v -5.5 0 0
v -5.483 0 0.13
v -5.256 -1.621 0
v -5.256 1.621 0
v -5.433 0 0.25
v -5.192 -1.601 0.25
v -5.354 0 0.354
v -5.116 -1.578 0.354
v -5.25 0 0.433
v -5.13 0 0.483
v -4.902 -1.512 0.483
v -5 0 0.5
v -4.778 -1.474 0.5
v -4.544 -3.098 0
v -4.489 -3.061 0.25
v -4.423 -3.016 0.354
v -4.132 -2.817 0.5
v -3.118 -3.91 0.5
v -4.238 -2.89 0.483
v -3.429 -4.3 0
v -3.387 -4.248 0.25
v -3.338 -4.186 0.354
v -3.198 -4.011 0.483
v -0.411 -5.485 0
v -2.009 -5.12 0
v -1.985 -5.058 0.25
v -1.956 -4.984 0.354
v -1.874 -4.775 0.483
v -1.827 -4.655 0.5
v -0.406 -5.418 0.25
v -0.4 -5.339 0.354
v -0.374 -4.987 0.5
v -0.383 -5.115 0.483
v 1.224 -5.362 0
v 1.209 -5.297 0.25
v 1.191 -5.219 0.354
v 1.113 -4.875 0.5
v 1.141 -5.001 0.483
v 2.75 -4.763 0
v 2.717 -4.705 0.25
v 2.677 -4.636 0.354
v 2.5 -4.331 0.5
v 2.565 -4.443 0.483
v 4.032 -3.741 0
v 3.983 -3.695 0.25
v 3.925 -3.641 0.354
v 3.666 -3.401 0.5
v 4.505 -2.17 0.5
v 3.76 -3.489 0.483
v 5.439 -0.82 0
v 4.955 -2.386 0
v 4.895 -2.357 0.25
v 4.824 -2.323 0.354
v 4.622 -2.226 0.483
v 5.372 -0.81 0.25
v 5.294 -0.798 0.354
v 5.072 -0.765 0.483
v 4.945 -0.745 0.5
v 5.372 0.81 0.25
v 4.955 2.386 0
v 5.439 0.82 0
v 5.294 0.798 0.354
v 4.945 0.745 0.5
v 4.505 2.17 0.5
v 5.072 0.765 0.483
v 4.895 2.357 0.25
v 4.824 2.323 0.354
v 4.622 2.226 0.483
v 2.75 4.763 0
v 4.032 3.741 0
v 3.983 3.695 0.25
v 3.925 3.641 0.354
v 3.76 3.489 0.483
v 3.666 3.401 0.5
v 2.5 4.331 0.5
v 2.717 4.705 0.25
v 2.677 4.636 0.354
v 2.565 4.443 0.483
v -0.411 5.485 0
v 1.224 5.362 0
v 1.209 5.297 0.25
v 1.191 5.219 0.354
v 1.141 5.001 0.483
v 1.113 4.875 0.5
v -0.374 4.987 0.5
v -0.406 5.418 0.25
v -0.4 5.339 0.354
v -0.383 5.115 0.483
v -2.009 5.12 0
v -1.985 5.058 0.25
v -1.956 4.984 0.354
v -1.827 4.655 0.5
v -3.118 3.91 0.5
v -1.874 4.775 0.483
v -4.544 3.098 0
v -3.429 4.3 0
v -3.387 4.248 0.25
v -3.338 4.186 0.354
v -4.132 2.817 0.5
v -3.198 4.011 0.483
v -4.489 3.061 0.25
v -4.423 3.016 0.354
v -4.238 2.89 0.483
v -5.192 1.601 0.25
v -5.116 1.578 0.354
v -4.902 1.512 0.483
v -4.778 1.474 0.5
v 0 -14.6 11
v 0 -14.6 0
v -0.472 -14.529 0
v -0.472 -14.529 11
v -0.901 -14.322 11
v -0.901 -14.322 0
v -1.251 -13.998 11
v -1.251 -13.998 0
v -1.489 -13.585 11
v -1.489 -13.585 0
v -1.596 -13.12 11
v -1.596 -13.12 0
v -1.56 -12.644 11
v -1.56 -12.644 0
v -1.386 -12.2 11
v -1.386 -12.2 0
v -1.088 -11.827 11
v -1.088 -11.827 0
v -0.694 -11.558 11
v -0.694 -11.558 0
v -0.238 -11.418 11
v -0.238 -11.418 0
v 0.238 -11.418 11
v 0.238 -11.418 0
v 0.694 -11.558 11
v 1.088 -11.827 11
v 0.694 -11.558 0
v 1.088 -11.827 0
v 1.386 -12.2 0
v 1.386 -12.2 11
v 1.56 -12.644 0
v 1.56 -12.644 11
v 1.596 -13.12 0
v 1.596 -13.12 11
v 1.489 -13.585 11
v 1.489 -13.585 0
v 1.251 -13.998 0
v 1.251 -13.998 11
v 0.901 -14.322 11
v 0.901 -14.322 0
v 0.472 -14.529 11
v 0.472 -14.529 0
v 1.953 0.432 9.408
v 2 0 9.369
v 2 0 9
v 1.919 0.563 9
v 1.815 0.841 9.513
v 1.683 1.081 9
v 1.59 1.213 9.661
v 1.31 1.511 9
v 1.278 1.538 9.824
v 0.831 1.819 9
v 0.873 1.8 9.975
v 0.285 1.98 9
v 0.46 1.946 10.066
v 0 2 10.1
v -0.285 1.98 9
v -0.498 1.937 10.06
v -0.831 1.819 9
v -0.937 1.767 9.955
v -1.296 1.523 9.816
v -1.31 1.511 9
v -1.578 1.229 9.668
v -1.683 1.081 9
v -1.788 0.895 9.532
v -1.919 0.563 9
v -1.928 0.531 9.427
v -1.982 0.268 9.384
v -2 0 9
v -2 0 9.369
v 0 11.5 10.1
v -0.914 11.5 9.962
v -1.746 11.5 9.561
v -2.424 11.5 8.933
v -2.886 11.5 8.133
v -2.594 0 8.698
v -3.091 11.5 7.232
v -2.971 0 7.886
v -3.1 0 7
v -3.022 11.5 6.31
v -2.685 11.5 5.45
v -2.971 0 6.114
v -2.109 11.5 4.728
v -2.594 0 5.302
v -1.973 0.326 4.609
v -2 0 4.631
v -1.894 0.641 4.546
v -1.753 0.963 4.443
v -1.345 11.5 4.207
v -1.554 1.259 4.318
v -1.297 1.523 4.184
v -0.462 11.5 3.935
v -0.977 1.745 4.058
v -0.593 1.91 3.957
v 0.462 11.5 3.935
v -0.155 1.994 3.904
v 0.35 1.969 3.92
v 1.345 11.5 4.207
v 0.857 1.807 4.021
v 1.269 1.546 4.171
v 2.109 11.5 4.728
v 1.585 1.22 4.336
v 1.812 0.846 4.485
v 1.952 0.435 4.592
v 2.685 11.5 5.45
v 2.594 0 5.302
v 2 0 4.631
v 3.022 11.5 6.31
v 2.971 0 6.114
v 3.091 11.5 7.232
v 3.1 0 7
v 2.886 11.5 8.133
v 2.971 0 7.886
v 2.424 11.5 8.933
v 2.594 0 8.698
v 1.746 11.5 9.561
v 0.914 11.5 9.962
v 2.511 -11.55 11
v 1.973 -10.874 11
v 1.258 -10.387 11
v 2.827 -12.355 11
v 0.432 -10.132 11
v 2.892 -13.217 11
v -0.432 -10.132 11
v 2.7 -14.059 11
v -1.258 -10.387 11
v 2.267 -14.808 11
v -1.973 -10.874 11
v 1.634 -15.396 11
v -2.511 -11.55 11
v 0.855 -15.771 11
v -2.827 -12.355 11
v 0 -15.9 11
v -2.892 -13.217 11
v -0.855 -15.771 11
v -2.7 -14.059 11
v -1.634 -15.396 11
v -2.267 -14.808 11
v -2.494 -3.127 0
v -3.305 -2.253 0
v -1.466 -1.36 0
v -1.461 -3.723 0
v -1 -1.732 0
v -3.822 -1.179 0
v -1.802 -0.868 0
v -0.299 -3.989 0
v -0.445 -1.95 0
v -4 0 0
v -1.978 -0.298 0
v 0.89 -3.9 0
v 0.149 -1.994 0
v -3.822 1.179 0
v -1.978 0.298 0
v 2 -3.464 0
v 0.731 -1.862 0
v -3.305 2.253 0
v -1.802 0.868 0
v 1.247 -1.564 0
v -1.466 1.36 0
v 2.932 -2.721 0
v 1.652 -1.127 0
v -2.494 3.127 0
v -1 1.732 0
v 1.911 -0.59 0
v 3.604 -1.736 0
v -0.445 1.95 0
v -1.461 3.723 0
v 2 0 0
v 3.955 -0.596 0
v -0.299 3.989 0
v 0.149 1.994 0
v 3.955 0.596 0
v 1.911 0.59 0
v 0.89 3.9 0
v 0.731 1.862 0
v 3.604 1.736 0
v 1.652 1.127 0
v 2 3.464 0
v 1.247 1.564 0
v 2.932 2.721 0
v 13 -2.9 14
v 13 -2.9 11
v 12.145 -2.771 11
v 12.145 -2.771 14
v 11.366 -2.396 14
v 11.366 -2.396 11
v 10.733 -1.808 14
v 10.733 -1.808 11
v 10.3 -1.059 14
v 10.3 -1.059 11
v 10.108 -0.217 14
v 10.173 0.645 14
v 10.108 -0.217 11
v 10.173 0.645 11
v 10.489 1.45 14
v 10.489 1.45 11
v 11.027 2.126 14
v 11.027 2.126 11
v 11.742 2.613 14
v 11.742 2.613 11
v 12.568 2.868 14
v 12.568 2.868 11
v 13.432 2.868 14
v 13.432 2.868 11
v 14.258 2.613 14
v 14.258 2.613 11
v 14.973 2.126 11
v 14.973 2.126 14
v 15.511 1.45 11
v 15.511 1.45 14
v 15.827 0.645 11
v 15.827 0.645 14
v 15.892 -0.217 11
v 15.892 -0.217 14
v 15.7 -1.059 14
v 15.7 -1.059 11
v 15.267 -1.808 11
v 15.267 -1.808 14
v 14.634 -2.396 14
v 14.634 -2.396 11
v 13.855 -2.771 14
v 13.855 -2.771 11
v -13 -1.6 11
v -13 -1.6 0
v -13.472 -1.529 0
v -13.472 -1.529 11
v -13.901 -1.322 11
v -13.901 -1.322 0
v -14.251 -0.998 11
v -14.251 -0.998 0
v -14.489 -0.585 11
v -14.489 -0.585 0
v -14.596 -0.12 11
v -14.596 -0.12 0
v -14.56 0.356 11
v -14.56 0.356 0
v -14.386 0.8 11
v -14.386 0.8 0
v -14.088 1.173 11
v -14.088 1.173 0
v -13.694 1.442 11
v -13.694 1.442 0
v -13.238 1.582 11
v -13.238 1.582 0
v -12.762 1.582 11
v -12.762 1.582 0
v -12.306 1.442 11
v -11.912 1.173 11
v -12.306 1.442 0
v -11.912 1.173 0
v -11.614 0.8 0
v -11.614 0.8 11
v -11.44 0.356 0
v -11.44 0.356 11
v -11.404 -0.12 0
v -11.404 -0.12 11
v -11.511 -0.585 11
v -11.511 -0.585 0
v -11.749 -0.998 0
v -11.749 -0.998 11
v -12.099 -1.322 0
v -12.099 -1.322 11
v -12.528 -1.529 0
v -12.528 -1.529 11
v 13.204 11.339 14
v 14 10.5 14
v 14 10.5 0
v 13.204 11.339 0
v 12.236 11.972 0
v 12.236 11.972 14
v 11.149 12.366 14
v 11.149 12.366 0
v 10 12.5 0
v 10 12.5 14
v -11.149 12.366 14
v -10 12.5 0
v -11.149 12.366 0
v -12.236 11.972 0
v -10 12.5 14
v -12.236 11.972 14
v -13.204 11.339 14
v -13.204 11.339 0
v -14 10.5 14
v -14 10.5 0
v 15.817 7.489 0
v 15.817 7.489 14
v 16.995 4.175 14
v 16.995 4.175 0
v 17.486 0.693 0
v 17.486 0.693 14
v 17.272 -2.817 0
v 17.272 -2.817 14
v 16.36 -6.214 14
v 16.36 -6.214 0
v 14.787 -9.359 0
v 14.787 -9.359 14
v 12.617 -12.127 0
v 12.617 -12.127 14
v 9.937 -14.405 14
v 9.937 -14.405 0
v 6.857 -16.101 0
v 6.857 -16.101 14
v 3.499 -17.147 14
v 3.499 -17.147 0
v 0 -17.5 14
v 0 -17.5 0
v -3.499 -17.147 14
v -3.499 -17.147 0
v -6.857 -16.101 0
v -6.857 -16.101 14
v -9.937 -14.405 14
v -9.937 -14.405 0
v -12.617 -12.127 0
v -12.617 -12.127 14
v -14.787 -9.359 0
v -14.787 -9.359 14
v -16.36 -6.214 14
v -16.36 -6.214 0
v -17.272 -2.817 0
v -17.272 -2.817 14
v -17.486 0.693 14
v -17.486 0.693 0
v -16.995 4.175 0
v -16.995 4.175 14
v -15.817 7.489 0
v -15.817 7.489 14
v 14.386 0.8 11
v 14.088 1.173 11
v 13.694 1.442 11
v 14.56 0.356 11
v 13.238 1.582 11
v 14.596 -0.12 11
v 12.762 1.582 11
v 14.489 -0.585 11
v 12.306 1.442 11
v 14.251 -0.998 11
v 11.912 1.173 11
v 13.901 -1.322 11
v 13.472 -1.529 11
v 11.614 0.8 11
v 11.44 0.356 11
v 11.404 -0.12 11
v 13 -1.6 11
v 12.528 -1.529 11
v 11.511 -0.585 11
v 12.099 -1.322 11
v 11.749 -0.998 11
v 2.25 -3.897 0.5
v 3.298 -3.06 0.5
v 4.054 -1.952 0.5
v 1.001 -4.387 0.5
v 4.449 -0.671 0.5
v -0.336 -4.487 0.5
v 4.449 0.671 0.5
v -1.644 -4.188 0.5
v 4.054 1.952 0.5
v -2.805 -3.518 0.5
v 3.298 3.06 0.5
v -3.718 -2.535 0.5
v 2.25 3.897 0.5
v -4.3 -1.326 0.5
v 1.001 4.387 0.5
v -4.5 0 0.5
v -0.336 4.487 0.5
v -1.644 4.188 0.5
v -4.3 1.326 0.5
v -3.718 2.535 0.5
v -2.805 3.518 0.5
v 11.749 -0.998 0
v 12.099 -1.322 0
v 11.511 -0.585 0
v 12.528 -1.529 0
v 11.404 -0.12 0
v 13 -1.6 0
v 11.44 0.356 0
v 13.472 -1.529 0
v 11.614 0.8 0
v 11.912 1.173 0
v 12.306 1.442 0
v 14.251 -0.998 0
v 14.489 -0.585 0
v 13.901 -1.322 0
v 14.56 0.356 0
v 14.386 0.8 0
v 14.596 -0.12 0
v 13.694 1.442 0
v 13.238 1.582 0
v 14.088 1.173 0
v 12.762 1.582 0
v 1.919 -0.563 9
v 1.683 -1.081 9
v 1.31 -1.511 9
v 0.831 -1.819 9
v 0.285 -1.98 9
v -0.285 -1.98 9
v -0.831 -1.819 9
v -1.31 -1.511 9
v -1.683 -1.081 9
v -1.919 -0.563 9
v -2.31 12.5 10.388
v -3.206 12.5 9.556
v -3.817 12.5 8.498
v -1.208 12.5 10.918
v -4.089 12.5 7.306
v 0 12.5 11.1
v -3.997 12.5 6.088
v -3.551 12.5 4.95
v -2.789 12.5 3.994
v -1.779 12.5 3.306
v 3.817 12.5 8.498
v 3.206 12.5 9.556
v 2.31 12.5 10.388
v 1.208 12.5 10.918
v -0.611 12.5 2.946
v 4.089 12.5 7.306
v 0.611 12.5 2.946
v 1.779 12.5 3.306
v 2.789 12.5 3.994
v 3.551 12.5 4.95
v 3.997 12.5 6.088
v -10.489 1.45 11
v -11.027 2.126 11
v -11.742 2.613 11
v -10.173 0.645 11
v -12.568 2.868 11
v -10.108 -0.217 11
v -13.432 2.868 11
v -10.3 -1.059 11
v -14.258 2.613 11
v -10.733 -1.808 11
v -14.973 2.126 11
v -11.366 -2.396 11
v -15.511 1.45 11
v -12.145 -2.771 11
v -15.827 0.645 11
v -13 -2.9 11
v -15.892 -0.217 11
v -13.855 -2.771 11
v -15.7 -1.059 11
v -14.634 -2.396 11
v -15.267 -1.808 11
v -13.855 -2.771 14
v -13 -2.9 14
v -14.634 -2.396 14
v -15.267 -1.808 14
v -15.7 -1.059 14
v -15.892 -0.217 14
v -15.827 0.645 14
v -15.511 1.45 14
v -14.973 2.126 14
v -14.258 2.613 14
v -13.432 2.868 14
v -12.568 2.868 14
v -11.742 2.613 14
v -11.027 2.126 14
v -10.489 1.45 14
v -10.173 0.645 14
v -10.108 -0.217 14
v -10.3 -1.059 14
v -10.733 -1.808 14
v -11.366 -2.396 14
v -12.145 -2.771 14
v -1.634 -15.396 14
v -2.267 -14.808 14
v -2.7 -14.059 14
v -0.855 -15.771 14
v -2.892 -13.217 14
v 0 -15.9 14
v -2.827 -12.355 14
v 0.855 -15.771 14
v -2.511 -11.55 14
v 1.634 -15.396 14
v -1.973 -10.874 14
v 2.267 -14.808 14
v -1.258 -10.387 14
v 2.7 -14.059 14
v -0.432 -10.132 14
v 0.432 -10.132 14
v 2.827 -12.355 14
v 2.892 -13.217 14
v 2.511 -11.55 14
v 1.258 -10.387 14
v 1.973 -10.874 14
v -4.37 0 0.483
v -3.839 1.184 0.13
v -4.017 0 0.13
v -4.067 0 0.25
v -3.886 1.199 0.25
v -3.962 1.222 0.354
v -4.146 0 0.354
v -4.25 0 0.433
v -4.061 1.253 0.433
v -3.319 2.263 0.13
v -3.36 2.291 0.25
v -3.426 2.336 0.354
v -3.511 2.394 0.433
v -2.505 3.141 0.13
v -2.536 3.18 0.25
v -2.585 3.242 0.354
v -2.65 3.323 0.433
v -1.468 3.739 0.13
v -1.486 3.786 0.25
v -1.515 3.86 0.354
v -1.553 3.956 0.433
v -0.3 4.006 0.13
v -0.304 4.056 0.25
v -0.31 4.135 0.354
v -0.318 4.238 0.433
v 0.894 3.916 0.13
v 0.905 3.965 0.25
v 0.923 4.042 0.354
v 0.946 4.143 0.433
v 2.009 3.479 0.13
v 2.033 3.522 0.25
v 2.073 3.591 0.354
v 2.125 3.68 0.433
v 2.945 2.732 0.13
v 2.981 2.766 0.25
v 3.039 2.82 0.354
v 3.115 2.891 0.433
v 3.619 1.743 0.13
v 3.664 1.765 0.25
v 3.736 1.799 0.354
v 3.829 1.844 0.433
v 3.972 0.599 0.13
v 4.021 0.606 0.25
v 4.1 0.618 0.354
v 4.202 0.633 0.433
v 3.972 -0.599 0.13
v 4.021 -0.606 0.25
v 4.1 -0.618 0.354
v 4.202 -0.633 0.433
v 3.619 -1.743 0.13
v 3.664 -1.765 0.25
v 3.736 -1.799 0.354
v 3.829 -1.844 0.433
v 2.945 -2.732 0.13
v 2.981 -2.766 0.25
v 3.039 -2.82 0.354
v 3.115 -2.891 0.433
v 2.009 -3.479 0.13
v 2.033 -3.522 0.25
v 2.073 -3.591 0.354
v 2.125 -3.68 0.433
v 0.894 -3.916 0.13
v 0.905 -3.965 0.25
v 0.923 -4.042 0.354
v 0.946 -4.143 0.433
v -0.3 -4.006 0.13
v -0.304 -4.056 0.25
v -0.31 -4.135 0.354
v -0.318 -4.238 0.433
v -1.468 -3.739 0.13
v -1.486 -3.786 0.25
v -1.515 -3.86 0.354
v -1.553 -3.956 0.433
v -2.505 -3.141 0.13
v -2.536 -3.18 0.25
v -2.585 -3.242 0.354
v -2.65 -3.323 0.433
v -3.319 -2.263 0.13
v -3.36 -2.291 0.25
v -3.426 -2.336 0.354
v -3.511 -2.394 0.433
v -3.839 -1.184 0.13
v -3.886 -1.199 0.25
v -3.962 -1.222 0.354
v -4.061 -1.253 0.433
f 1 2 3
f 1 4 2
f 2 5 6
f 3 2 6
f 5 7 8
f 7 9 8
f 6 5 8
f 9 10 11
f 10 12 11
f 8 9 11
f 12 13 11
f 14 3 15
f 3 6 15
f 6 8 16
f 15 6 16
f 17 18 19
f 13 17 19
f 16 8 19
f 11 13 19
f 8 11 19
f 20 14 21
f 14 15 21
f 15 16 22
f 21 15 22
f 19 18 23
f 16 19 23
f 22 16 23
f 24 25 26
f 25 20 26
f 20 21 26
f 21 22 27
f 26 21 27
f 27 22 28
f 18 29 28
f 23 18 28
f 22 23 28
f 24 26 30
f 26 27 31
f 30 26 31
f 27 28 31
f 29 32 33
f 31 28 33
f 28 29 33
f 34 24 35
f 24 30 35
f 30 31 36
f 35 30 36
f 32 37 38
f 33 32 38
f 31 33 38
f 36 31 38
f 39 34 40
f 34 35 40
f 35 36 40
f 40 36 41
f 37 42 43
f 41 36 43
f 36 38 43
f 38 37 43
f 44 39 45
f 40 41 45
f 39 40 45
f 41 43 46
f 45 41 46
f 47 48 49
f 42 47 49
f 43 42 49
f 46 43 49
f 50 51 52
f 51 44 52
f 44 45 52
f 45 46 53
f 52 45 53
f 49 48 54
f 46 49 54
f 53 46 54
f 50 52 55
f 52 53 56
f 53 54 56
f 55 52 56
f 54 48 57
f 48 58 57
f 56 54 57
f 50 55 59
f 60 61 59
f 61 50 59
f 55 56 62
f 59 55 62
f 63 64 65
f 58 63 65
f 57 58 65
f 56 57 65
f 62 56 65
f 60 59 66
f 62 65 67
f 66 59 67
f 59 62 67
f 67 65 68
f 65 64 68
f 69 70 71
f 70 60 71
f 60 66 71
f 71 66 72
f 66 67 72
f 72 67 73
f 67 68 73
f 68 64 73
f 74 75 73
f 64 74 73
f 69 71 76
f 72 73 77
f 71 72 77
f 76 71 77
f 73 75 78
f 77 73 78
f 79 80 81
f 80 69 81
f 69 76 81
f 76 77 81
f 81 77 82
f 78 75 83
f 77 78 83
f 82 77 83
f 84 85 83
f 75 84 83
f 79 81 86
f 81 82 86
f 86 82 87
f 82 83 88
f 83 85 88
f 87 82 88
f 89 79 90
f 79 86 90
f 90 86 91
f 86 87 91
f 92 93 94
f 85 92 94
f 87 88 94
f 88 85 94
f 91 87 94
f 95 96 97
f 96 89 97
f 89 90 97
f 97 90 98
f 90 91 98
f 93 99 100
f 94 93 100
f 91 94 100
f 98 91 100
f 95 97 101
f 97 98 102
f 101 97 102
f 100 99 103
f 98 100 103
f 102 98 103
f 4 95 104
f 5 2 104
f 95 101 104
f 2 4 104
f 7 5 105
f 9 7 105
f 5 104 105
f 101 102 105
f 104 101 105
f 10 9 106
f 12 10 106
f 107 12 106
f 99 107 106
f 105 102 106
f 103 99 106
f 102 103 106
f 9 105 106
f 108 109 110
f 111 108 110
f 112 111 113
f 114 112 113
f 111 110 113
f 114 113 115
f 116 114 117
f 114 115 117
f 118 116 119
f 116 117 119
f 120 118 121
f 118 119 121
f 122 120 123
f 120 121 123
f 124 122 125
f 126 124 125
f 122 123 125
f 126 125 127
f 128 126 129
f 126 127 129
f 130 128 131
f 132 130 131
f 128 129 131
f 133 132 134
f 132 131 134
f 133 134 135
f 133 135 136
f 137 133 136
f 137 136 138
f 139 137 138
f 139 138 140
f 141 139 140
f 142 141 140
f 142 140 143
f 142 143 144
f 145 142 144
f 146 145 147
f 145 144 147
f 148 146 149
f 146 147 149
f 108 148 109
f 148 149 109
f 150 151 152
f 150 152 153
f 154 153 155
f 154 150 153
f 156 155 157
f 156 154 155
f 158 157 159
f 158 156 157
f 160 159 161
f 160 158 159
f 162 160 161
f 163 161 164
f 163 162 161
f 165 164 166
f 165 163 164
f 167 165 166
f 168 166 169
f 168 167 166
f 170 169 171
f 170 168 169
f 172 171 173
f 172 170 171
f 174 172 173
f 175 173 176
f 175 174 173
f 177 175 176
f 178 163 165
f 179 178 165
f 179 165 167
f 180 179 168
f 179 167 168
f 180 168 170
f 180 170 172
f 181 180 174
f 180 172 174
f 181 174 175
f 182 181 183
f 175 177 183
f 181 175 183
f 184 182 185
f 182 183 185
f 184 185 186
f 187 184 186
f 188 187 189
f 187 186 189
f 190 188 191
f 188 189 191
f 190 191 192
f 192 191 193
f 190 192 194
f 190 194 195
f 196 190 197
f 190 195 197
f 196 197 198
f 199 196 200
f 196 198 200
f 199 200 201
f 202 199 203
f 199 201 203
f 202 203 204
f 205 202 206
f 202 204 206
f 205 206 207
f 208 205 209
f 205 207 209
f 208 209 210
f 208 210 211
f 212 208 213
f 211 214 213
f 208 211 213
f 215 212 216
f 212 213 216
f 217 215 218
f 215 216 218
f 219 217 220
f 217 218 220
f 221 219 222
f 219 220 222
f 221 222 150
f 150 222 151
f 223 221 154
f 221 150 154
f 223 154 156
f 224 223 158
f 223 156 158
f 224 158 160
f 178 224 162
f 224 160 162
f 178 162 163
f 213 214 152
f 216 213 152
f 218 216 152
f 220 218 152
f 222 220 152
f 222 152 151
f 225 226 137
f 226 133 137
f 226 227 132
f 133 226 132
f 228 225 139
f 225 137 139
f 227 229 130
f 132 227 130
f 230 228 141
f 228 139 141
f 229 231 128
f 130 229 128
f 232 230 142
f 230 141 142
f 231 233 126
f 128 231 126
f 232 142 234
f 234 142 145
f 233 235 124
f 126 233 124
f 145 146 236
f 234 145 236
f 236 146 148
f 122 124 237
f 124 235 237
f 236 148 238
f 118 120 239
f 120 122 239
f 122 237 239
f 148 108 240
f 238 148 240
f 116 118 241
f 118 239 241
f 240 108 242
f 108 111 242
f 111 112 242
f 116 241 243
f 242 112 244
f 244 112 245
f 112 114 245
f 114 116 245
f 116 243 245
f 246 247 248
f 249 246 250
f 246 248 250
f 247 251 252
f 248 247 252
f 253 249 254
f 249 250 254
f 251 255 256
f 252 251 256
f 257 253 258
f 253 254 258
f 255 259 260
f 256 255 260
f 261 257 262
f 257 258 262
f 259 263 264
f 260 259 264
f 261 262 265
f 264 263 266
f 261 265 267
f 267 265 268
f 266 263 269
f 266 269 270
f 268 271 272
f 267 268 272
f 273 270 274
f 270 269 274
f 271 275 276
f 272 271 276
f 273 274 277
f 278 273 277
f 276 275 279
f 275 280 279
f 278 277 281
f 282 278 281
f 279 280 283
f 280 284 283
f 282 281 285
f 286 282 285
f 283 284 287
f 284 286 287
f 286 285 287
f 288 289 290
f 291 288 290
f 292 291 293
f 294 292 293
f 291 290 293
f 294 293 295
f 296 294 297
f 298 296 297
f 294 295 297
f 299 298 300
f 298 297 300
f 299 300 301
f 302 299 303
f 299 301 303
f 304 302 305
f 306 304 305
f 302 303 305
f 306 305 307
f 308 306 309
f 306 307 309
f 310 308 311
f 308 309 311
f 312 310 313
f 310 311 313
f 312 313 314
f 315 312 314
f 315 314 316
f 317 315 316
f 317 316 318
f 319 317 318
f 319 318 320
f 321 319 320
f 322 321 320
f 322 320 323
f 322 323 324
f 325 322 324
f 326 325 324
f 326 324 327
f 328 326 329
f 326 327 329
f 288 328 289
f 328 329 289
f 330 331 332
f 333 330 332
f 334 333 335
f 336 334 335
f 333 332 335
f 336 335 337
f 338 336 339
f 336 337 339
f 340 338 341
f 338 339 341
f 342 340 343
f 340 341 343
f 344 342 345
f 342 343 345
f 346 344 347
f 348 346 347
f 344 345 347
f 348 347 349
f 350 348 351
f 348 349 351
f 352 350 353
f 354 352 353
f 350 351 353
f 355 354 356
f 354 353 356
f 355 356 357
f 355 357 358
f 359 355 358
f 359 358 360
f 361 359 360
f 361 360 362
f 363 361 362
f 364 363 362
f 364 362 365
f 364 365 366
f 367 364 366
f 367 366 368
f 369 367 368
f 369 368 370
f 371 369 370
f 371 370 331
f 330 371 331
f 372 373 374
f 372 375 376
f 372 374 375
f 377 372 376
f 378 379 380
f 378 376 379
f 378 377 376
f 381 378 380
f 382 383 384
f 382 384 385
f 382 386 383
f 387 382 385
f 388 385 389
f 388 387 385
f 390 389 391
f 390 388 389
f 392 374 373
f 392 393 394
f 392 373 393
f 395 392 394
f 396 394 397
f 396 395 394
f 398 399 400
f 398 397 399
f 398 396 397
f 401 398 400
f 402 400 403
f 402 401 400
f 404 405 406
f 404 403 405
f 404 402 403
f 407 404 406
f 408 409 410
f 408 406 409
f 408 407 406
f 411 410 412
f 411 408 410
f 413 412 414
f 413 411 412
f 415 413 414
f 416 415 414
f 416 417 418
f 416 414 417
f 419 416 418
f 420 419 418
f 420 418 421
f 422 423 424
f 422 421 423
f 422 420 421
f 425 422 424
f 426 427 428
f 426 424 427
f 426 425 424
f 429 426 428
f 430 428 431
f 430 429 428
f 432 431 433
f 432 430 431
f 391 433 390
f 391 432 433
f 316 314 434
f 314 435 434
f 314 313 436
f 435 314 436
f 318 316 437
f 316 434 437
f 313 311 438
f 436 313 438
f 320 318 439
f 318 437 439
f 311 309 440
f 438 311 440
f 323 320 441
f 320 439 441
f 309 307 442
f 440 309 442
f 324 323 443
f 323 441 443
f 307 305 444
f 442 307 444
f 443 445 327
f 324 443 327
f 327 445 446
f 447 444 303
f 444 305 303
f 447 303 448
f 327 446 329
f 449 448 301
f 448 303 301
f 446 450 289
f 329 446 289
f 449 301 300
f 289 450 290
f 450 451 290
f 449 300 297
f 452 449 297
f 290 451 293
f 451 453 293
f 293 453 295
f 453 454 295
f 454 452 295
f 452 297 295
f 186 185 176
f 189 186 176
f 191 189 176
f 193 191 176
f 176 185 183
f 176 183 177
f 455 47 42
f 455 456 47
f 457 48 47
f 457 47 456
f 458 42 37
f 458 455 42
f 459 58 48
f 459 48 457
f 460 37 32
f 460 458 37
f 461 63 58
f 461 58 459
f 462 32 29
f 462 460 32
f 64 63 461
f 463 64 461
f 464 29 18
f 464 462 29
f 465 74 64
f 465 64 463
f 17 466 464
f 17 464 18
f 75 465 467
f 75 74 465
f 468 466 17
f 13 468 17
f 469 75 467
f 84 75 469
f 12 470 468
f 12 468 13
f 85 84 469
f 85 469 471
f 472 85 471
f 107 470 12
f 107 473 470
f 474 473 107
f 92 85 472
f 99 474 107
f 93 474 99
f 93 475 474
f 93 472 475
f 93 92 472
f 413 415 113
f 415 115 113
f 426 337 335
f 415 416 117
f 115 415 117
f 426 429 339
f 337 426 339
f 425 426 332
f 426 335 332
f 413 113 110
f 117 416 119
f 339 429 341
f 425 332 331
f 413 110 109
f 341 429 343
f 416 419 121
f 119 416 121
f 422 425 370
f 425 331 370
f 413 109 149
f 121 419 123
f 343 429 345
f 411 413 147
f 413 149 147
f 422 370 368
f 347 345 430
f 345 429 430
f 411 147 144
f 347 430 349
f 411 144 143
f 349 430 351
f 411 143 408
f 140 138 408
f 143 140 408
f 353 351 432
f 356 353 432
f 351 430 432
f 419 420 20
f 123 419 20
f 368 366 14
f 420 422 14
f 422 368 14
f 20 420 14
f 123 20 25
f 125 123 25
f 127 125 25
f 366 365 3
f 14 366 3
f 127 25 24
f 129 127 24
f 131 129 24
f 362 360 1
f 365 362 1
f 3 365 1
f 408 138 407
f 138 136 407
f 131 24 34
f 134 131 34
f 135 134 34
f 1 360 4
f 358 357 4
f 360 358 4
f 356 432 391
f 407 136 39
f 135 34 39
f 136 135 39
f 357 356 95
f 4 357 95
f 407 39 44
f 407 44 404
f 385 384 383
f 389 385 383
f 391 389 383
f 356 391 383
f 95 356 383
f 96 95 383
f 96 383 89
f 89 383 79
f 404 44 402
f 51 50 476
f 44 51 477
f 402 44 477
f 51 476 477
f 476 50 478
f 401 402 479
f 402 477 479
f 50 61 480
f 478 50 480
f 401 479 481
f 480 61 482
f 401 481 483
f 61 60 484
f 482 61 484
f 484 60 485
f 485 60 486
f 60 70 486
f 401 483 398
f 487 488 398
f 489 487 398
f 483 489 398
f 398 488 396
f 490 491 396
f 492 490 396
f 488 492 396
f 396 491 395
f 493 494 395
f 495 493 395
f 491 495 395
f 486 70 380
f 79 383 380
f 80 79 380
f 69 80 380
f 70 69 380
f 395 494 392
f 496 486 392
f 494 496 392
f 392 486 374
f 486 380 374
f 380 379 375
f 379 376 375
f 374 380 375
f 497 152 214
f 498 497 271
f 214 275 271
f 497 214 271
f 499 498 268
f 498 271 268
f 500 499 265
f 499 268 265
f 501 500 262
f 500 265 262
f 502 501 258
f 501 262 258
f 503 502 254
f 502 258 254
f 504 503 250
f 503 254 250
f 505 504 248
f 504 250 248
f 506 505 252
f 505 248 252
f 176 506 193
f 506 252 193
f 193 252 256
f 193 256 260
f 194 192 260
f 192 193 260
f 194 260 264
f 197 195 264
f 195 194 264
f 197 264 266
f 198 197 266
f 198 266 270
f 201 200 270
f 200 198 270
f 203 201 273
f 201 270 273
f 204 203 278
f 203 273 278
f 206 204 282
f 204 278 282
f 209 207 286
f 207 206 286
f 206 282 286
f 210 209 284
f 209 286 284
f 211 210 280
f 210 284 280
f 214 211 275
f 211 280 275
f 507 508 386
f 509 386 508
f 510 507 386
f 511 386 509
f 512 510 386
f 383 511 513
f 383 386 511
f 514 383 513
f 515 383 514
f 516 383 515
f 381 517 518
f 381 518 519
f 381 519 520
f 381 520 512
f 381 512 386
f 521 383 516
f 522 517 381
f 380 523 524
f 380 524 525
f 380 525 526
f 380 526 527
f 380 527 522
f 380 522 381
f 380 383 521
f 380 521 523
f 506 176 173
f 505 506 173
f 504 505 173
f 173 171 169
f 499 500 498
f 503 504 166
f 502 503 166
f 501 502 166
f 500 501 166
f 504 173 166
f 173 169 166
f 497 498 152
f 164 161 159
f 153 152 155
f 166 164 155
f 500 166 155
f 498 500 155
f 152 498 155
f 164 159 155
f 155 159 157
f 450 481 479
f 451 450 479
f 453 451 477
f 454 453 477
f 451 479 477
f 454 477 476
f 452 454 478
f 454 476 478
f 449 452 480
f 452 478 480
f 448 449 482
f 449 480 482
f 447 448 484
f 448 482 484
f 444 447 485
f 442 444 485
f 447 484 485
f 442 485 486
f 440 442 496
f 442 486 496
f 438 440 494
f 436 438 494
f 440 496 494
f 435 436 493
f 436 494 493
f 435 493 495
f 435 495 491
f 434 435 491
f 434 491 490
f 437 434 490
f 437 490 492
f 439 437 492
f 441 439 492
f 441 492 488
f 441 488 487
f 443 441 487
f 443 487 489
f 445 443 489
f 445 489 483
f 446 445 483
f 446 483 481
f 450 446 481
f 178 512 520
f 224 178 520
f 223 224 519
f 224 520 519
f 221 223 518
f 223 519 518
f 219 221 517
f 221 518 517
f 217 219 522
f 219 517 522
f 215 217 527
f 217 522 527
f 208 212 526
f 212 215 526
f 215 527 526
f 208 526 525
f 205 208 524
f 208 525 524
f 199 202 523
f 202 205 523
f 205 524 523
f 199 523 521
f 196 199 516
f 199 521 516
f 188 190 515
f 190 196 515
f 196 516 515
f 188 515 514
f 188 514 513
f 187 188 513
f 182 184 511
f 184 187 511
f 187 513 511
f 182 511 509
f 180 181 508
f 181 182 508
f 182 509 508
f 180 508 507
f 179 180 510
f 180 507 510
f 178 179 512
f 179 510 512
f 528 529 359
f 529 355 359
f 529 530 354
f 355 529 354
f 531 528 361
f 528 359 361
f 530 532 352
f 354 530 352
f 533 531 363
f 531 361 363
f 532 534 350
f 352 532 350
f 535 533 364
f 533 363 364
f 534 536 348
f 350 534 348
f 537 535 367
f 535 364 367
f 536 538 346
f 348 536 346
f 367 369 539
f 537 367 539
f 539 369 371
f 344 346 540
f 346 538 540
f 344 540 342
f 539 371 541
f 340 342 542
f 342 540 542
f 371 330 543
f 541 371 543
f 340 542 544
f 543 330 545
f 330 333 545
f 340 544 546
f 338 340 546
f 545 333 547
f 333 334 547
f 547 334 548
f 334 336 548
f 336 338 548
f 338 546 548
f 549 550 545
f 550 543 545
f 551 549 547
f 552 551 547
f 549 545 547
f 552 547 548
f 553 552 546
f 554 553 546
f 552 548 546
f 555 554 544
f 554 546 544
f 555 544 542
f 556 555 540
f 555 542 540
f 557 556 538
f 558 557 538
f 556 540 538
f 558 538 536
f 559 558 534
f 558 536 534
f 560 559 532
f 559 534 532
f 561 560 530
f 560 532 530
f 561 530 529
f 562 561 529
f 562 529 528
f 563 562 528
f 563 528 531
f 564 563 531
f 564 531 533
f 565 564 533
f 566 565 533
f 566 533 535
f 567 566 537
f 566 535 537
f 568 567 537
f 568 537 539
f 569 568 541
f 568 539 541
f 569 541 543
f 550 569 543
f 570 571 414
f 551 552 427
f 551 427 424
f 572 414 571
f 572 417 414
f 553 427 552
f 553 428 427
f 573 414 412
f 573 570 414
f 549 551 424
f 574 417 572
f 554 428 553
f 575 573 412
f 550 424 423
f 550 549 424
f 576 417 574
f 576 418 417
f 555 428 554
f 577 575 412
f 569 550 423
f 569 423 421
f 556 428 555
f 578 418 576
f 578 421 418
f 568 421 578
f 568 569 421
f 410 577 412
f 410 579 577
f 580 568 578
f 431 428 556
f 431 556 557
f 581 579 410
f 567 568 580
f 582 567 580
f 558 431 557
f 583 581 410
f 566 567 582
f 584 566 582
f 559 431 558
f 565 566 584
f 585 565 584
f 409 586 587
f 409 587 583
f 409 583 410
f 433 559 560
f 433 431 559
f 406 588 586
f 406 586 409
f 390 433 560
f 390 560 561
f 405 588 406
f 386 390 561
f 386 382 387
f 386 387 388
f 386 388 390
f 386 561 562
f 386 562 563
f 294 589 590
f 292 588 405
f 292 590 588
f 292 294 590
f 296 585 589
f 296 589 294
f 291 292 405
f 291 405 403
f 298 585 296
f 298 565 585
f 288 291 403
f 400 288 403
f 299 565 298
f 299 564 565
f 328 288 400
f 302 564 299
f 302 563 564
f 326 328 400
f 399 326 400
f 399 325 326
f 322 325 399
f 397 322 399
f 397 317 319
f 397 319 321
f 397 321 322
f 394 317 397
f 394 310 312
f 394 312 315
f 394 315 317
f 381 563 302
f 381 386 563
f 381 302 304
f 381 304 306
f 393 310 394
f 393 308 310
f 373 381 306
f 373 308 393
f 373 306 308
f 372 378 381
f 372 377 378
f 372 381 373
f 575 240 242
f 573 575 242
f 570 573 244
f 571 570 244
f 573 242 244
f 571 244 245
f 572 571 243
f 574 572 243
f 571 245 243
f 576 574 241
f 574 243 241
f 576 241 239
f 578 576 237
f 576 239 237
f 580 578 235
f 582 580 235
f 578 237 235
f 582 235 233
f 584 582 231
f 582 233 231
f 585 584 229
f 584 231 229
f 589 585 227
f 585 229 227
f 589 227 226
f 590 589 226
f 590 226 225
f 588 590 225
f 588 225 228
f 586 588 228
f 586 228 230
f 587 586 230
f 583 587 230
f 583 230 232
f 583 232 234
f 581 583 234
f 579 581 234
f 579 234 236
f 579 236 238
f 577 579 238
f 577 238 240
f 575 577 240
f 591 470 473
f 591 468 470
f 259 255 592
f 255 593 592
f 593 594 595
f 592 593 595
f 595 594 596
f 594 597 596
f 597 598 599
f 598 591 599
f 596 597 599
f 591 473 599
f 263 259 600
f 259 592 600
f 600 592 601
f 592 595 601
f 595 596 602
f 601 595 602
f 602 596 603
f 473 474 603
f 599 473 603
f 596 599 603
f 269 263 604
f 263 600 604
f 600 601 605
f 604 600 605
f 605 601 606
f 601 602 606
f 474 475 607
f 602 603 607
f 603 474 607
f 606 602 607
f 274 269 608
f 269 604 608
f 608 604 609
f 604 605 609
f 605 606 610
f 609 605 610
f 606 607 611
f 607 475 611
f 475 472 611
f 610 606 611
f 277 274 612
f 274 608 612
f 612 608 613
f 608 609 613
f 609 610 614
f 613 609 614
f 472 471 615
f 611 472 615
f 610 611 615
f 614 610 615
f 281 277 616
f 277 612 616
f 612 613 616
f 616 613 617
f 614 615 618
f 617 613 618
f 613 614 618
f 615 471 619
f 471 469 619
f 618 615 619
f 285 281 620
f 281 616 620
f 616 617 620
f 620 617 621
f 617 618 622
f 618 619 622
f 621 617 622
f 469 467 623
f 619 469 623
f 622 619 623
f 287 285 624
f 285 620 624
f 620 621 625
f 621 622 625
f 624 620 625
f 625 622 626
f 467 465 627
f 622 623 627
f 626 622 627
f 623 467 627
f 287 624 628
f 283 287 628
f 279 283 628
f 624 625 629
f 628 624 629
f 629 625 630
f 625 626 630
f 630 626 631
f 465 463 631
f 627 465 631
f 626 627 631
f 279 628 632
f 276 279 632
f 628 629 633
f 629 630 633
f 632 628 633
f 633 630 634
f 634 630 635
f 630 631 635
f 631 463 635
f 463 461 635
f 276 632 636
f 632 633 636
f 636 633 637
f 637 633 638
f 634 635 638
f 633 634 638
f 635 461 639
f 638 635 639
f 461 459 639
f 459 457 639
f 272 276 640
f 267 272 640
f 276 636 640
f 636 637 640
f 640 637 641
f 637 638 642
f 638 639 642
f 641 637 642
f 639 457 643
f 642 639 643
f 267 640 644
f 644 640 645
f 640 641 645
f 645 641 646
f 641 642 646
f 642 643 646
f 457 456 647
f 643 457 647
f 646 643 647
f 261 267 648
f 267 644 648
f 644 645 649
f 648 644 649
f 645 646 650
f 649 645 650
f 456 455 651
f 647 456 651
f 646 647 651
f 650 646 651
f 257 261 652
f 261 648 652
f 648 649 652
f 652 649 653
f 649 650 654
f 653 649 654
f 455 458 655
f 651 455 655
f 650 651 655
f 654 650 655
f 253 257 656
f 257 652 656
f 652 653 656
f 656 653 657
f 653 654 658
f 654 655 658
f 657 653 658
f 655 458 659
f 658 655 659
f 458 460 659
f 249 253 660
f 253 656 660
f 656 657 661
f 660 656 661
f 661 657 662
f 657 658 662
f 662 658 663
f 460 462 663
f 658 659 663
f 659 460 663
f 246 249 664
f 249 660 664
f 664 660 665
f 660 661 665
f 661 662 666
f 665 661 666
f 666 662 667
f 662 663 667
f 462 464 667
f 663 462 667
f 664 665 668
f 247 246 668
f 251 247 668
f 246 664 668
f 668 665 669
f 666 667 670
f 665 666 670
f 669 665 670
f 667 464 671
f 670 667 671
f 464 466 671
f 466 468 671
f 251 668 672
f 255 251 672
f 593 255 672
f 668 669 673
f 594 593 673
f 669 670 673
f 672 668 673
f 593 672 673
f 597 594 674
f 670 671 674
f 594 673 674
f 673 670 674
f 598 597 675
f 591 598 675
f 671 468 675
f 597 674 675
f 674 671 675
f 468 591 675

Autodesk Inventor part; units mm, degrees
ref_plane "YZ Plane" through (0, 0, 0) normal (1, 0, 0) x (0, 1, 0)
ref_plane "XZ Plane" through (0, 0, 0) normal (0, 1, 0) x (-1, 0, 0)
ref_plane "XY Plane" through (0, 0, 0) normal (0, 0, 1) x (1, 0, 0)
sketch "Sketch1" plane through (0, 0, 0) normal (0, 0, 1) x (1, 0, 0)
  circle A0 centre (0, 0) radius 2
  arc A1 (-12.2474, 12.5) -> (12.2474, 12.5) centre (0, 0) ccw
  line L0 (-12.2474, 12.5) -> (12.2474, 12.5)
  dimension "d0" = 4
  dimension "d1" = 35
  dimension "d2" = 12.5
extrude "Extrusion1" add sketch "Sketch1" along normal blind 14
sketch "Sketch2" plane through (-12.2474, 12.5, 0) normal (0, 1, 0) x (1, 0, 0)
  line L0 (0, 0) -> (0, -14) construction
  line L1 (0, -7) -> (24.4949, -7) construction
  line L2 (24.4949, 0) -> (24.4949, -14) construction
  point P0 (12.2474, 0)
  point P1 (12.2474, -7)
hole "Hole1" at (0, 12.5, 7) direction (0, -1, 0) diameter 6.2 depth 12.5
sketch "Sketch4" plane through (0, 0, 14) normal (0, 0, 1) x (1, 0, 0)
  circle A0 centre (0, 0) radius 2
  circle A1 centre (0, 0) radius 2 construction
extrude "Extrusion3" add sketch "Sketch4" against normal blind 5
sketch "Sketch5" plane through (0, 0, 14) normal (0, 0, 1) x (1, 0, 0)
  point P0 (0, 0)
sketch "Sketch6" plane through (0, 0, 0) normal (0, 0, -1) x (-1, 0, 0)
  circle A0 centre (0, 0) radius 4
  circle A1 centre (0, 0) radius 5.5
  dimension "d16" = 8
  dimension "d29" = 1.5
extrude "Extrusion4" cut sketch "Sketch6" against normal blind 0.5
fillet "Fillet1" radius 0.5 2 edges at (4, 0, 0.5) (5.5, 0, 0.5)
fillet "Fillet2" radius 5 2 edges at (-12.2474, 12.5, 7) (12.2474, 12.5, 7)
sketch "Sketch8" plane through (0, 0, 14) normal (0, 0, 1) x (1, 0, 0)
  circle A0 centre (0, 0) radius 13 construction
  line L0 (-13, 0) -> (13, 0) construction
  line L1 (0, 0) -> (0, -13) construction
  dimension "d31" = 26
hole "Hole3" at (-13, 0, 14) at (13, 0, 14) at (0, -13, 14) direction (0, 0, -1) diameter 3.2 end through all counterbore diameter 5.8 counterbore depth 3
chamfer "Chamfer1" distance 1 angle 45 1 edges at (0, 12.5, 3.9)
properties part number "CH_01_0036_syringe_pump_mount" material "ABS Plastic"
